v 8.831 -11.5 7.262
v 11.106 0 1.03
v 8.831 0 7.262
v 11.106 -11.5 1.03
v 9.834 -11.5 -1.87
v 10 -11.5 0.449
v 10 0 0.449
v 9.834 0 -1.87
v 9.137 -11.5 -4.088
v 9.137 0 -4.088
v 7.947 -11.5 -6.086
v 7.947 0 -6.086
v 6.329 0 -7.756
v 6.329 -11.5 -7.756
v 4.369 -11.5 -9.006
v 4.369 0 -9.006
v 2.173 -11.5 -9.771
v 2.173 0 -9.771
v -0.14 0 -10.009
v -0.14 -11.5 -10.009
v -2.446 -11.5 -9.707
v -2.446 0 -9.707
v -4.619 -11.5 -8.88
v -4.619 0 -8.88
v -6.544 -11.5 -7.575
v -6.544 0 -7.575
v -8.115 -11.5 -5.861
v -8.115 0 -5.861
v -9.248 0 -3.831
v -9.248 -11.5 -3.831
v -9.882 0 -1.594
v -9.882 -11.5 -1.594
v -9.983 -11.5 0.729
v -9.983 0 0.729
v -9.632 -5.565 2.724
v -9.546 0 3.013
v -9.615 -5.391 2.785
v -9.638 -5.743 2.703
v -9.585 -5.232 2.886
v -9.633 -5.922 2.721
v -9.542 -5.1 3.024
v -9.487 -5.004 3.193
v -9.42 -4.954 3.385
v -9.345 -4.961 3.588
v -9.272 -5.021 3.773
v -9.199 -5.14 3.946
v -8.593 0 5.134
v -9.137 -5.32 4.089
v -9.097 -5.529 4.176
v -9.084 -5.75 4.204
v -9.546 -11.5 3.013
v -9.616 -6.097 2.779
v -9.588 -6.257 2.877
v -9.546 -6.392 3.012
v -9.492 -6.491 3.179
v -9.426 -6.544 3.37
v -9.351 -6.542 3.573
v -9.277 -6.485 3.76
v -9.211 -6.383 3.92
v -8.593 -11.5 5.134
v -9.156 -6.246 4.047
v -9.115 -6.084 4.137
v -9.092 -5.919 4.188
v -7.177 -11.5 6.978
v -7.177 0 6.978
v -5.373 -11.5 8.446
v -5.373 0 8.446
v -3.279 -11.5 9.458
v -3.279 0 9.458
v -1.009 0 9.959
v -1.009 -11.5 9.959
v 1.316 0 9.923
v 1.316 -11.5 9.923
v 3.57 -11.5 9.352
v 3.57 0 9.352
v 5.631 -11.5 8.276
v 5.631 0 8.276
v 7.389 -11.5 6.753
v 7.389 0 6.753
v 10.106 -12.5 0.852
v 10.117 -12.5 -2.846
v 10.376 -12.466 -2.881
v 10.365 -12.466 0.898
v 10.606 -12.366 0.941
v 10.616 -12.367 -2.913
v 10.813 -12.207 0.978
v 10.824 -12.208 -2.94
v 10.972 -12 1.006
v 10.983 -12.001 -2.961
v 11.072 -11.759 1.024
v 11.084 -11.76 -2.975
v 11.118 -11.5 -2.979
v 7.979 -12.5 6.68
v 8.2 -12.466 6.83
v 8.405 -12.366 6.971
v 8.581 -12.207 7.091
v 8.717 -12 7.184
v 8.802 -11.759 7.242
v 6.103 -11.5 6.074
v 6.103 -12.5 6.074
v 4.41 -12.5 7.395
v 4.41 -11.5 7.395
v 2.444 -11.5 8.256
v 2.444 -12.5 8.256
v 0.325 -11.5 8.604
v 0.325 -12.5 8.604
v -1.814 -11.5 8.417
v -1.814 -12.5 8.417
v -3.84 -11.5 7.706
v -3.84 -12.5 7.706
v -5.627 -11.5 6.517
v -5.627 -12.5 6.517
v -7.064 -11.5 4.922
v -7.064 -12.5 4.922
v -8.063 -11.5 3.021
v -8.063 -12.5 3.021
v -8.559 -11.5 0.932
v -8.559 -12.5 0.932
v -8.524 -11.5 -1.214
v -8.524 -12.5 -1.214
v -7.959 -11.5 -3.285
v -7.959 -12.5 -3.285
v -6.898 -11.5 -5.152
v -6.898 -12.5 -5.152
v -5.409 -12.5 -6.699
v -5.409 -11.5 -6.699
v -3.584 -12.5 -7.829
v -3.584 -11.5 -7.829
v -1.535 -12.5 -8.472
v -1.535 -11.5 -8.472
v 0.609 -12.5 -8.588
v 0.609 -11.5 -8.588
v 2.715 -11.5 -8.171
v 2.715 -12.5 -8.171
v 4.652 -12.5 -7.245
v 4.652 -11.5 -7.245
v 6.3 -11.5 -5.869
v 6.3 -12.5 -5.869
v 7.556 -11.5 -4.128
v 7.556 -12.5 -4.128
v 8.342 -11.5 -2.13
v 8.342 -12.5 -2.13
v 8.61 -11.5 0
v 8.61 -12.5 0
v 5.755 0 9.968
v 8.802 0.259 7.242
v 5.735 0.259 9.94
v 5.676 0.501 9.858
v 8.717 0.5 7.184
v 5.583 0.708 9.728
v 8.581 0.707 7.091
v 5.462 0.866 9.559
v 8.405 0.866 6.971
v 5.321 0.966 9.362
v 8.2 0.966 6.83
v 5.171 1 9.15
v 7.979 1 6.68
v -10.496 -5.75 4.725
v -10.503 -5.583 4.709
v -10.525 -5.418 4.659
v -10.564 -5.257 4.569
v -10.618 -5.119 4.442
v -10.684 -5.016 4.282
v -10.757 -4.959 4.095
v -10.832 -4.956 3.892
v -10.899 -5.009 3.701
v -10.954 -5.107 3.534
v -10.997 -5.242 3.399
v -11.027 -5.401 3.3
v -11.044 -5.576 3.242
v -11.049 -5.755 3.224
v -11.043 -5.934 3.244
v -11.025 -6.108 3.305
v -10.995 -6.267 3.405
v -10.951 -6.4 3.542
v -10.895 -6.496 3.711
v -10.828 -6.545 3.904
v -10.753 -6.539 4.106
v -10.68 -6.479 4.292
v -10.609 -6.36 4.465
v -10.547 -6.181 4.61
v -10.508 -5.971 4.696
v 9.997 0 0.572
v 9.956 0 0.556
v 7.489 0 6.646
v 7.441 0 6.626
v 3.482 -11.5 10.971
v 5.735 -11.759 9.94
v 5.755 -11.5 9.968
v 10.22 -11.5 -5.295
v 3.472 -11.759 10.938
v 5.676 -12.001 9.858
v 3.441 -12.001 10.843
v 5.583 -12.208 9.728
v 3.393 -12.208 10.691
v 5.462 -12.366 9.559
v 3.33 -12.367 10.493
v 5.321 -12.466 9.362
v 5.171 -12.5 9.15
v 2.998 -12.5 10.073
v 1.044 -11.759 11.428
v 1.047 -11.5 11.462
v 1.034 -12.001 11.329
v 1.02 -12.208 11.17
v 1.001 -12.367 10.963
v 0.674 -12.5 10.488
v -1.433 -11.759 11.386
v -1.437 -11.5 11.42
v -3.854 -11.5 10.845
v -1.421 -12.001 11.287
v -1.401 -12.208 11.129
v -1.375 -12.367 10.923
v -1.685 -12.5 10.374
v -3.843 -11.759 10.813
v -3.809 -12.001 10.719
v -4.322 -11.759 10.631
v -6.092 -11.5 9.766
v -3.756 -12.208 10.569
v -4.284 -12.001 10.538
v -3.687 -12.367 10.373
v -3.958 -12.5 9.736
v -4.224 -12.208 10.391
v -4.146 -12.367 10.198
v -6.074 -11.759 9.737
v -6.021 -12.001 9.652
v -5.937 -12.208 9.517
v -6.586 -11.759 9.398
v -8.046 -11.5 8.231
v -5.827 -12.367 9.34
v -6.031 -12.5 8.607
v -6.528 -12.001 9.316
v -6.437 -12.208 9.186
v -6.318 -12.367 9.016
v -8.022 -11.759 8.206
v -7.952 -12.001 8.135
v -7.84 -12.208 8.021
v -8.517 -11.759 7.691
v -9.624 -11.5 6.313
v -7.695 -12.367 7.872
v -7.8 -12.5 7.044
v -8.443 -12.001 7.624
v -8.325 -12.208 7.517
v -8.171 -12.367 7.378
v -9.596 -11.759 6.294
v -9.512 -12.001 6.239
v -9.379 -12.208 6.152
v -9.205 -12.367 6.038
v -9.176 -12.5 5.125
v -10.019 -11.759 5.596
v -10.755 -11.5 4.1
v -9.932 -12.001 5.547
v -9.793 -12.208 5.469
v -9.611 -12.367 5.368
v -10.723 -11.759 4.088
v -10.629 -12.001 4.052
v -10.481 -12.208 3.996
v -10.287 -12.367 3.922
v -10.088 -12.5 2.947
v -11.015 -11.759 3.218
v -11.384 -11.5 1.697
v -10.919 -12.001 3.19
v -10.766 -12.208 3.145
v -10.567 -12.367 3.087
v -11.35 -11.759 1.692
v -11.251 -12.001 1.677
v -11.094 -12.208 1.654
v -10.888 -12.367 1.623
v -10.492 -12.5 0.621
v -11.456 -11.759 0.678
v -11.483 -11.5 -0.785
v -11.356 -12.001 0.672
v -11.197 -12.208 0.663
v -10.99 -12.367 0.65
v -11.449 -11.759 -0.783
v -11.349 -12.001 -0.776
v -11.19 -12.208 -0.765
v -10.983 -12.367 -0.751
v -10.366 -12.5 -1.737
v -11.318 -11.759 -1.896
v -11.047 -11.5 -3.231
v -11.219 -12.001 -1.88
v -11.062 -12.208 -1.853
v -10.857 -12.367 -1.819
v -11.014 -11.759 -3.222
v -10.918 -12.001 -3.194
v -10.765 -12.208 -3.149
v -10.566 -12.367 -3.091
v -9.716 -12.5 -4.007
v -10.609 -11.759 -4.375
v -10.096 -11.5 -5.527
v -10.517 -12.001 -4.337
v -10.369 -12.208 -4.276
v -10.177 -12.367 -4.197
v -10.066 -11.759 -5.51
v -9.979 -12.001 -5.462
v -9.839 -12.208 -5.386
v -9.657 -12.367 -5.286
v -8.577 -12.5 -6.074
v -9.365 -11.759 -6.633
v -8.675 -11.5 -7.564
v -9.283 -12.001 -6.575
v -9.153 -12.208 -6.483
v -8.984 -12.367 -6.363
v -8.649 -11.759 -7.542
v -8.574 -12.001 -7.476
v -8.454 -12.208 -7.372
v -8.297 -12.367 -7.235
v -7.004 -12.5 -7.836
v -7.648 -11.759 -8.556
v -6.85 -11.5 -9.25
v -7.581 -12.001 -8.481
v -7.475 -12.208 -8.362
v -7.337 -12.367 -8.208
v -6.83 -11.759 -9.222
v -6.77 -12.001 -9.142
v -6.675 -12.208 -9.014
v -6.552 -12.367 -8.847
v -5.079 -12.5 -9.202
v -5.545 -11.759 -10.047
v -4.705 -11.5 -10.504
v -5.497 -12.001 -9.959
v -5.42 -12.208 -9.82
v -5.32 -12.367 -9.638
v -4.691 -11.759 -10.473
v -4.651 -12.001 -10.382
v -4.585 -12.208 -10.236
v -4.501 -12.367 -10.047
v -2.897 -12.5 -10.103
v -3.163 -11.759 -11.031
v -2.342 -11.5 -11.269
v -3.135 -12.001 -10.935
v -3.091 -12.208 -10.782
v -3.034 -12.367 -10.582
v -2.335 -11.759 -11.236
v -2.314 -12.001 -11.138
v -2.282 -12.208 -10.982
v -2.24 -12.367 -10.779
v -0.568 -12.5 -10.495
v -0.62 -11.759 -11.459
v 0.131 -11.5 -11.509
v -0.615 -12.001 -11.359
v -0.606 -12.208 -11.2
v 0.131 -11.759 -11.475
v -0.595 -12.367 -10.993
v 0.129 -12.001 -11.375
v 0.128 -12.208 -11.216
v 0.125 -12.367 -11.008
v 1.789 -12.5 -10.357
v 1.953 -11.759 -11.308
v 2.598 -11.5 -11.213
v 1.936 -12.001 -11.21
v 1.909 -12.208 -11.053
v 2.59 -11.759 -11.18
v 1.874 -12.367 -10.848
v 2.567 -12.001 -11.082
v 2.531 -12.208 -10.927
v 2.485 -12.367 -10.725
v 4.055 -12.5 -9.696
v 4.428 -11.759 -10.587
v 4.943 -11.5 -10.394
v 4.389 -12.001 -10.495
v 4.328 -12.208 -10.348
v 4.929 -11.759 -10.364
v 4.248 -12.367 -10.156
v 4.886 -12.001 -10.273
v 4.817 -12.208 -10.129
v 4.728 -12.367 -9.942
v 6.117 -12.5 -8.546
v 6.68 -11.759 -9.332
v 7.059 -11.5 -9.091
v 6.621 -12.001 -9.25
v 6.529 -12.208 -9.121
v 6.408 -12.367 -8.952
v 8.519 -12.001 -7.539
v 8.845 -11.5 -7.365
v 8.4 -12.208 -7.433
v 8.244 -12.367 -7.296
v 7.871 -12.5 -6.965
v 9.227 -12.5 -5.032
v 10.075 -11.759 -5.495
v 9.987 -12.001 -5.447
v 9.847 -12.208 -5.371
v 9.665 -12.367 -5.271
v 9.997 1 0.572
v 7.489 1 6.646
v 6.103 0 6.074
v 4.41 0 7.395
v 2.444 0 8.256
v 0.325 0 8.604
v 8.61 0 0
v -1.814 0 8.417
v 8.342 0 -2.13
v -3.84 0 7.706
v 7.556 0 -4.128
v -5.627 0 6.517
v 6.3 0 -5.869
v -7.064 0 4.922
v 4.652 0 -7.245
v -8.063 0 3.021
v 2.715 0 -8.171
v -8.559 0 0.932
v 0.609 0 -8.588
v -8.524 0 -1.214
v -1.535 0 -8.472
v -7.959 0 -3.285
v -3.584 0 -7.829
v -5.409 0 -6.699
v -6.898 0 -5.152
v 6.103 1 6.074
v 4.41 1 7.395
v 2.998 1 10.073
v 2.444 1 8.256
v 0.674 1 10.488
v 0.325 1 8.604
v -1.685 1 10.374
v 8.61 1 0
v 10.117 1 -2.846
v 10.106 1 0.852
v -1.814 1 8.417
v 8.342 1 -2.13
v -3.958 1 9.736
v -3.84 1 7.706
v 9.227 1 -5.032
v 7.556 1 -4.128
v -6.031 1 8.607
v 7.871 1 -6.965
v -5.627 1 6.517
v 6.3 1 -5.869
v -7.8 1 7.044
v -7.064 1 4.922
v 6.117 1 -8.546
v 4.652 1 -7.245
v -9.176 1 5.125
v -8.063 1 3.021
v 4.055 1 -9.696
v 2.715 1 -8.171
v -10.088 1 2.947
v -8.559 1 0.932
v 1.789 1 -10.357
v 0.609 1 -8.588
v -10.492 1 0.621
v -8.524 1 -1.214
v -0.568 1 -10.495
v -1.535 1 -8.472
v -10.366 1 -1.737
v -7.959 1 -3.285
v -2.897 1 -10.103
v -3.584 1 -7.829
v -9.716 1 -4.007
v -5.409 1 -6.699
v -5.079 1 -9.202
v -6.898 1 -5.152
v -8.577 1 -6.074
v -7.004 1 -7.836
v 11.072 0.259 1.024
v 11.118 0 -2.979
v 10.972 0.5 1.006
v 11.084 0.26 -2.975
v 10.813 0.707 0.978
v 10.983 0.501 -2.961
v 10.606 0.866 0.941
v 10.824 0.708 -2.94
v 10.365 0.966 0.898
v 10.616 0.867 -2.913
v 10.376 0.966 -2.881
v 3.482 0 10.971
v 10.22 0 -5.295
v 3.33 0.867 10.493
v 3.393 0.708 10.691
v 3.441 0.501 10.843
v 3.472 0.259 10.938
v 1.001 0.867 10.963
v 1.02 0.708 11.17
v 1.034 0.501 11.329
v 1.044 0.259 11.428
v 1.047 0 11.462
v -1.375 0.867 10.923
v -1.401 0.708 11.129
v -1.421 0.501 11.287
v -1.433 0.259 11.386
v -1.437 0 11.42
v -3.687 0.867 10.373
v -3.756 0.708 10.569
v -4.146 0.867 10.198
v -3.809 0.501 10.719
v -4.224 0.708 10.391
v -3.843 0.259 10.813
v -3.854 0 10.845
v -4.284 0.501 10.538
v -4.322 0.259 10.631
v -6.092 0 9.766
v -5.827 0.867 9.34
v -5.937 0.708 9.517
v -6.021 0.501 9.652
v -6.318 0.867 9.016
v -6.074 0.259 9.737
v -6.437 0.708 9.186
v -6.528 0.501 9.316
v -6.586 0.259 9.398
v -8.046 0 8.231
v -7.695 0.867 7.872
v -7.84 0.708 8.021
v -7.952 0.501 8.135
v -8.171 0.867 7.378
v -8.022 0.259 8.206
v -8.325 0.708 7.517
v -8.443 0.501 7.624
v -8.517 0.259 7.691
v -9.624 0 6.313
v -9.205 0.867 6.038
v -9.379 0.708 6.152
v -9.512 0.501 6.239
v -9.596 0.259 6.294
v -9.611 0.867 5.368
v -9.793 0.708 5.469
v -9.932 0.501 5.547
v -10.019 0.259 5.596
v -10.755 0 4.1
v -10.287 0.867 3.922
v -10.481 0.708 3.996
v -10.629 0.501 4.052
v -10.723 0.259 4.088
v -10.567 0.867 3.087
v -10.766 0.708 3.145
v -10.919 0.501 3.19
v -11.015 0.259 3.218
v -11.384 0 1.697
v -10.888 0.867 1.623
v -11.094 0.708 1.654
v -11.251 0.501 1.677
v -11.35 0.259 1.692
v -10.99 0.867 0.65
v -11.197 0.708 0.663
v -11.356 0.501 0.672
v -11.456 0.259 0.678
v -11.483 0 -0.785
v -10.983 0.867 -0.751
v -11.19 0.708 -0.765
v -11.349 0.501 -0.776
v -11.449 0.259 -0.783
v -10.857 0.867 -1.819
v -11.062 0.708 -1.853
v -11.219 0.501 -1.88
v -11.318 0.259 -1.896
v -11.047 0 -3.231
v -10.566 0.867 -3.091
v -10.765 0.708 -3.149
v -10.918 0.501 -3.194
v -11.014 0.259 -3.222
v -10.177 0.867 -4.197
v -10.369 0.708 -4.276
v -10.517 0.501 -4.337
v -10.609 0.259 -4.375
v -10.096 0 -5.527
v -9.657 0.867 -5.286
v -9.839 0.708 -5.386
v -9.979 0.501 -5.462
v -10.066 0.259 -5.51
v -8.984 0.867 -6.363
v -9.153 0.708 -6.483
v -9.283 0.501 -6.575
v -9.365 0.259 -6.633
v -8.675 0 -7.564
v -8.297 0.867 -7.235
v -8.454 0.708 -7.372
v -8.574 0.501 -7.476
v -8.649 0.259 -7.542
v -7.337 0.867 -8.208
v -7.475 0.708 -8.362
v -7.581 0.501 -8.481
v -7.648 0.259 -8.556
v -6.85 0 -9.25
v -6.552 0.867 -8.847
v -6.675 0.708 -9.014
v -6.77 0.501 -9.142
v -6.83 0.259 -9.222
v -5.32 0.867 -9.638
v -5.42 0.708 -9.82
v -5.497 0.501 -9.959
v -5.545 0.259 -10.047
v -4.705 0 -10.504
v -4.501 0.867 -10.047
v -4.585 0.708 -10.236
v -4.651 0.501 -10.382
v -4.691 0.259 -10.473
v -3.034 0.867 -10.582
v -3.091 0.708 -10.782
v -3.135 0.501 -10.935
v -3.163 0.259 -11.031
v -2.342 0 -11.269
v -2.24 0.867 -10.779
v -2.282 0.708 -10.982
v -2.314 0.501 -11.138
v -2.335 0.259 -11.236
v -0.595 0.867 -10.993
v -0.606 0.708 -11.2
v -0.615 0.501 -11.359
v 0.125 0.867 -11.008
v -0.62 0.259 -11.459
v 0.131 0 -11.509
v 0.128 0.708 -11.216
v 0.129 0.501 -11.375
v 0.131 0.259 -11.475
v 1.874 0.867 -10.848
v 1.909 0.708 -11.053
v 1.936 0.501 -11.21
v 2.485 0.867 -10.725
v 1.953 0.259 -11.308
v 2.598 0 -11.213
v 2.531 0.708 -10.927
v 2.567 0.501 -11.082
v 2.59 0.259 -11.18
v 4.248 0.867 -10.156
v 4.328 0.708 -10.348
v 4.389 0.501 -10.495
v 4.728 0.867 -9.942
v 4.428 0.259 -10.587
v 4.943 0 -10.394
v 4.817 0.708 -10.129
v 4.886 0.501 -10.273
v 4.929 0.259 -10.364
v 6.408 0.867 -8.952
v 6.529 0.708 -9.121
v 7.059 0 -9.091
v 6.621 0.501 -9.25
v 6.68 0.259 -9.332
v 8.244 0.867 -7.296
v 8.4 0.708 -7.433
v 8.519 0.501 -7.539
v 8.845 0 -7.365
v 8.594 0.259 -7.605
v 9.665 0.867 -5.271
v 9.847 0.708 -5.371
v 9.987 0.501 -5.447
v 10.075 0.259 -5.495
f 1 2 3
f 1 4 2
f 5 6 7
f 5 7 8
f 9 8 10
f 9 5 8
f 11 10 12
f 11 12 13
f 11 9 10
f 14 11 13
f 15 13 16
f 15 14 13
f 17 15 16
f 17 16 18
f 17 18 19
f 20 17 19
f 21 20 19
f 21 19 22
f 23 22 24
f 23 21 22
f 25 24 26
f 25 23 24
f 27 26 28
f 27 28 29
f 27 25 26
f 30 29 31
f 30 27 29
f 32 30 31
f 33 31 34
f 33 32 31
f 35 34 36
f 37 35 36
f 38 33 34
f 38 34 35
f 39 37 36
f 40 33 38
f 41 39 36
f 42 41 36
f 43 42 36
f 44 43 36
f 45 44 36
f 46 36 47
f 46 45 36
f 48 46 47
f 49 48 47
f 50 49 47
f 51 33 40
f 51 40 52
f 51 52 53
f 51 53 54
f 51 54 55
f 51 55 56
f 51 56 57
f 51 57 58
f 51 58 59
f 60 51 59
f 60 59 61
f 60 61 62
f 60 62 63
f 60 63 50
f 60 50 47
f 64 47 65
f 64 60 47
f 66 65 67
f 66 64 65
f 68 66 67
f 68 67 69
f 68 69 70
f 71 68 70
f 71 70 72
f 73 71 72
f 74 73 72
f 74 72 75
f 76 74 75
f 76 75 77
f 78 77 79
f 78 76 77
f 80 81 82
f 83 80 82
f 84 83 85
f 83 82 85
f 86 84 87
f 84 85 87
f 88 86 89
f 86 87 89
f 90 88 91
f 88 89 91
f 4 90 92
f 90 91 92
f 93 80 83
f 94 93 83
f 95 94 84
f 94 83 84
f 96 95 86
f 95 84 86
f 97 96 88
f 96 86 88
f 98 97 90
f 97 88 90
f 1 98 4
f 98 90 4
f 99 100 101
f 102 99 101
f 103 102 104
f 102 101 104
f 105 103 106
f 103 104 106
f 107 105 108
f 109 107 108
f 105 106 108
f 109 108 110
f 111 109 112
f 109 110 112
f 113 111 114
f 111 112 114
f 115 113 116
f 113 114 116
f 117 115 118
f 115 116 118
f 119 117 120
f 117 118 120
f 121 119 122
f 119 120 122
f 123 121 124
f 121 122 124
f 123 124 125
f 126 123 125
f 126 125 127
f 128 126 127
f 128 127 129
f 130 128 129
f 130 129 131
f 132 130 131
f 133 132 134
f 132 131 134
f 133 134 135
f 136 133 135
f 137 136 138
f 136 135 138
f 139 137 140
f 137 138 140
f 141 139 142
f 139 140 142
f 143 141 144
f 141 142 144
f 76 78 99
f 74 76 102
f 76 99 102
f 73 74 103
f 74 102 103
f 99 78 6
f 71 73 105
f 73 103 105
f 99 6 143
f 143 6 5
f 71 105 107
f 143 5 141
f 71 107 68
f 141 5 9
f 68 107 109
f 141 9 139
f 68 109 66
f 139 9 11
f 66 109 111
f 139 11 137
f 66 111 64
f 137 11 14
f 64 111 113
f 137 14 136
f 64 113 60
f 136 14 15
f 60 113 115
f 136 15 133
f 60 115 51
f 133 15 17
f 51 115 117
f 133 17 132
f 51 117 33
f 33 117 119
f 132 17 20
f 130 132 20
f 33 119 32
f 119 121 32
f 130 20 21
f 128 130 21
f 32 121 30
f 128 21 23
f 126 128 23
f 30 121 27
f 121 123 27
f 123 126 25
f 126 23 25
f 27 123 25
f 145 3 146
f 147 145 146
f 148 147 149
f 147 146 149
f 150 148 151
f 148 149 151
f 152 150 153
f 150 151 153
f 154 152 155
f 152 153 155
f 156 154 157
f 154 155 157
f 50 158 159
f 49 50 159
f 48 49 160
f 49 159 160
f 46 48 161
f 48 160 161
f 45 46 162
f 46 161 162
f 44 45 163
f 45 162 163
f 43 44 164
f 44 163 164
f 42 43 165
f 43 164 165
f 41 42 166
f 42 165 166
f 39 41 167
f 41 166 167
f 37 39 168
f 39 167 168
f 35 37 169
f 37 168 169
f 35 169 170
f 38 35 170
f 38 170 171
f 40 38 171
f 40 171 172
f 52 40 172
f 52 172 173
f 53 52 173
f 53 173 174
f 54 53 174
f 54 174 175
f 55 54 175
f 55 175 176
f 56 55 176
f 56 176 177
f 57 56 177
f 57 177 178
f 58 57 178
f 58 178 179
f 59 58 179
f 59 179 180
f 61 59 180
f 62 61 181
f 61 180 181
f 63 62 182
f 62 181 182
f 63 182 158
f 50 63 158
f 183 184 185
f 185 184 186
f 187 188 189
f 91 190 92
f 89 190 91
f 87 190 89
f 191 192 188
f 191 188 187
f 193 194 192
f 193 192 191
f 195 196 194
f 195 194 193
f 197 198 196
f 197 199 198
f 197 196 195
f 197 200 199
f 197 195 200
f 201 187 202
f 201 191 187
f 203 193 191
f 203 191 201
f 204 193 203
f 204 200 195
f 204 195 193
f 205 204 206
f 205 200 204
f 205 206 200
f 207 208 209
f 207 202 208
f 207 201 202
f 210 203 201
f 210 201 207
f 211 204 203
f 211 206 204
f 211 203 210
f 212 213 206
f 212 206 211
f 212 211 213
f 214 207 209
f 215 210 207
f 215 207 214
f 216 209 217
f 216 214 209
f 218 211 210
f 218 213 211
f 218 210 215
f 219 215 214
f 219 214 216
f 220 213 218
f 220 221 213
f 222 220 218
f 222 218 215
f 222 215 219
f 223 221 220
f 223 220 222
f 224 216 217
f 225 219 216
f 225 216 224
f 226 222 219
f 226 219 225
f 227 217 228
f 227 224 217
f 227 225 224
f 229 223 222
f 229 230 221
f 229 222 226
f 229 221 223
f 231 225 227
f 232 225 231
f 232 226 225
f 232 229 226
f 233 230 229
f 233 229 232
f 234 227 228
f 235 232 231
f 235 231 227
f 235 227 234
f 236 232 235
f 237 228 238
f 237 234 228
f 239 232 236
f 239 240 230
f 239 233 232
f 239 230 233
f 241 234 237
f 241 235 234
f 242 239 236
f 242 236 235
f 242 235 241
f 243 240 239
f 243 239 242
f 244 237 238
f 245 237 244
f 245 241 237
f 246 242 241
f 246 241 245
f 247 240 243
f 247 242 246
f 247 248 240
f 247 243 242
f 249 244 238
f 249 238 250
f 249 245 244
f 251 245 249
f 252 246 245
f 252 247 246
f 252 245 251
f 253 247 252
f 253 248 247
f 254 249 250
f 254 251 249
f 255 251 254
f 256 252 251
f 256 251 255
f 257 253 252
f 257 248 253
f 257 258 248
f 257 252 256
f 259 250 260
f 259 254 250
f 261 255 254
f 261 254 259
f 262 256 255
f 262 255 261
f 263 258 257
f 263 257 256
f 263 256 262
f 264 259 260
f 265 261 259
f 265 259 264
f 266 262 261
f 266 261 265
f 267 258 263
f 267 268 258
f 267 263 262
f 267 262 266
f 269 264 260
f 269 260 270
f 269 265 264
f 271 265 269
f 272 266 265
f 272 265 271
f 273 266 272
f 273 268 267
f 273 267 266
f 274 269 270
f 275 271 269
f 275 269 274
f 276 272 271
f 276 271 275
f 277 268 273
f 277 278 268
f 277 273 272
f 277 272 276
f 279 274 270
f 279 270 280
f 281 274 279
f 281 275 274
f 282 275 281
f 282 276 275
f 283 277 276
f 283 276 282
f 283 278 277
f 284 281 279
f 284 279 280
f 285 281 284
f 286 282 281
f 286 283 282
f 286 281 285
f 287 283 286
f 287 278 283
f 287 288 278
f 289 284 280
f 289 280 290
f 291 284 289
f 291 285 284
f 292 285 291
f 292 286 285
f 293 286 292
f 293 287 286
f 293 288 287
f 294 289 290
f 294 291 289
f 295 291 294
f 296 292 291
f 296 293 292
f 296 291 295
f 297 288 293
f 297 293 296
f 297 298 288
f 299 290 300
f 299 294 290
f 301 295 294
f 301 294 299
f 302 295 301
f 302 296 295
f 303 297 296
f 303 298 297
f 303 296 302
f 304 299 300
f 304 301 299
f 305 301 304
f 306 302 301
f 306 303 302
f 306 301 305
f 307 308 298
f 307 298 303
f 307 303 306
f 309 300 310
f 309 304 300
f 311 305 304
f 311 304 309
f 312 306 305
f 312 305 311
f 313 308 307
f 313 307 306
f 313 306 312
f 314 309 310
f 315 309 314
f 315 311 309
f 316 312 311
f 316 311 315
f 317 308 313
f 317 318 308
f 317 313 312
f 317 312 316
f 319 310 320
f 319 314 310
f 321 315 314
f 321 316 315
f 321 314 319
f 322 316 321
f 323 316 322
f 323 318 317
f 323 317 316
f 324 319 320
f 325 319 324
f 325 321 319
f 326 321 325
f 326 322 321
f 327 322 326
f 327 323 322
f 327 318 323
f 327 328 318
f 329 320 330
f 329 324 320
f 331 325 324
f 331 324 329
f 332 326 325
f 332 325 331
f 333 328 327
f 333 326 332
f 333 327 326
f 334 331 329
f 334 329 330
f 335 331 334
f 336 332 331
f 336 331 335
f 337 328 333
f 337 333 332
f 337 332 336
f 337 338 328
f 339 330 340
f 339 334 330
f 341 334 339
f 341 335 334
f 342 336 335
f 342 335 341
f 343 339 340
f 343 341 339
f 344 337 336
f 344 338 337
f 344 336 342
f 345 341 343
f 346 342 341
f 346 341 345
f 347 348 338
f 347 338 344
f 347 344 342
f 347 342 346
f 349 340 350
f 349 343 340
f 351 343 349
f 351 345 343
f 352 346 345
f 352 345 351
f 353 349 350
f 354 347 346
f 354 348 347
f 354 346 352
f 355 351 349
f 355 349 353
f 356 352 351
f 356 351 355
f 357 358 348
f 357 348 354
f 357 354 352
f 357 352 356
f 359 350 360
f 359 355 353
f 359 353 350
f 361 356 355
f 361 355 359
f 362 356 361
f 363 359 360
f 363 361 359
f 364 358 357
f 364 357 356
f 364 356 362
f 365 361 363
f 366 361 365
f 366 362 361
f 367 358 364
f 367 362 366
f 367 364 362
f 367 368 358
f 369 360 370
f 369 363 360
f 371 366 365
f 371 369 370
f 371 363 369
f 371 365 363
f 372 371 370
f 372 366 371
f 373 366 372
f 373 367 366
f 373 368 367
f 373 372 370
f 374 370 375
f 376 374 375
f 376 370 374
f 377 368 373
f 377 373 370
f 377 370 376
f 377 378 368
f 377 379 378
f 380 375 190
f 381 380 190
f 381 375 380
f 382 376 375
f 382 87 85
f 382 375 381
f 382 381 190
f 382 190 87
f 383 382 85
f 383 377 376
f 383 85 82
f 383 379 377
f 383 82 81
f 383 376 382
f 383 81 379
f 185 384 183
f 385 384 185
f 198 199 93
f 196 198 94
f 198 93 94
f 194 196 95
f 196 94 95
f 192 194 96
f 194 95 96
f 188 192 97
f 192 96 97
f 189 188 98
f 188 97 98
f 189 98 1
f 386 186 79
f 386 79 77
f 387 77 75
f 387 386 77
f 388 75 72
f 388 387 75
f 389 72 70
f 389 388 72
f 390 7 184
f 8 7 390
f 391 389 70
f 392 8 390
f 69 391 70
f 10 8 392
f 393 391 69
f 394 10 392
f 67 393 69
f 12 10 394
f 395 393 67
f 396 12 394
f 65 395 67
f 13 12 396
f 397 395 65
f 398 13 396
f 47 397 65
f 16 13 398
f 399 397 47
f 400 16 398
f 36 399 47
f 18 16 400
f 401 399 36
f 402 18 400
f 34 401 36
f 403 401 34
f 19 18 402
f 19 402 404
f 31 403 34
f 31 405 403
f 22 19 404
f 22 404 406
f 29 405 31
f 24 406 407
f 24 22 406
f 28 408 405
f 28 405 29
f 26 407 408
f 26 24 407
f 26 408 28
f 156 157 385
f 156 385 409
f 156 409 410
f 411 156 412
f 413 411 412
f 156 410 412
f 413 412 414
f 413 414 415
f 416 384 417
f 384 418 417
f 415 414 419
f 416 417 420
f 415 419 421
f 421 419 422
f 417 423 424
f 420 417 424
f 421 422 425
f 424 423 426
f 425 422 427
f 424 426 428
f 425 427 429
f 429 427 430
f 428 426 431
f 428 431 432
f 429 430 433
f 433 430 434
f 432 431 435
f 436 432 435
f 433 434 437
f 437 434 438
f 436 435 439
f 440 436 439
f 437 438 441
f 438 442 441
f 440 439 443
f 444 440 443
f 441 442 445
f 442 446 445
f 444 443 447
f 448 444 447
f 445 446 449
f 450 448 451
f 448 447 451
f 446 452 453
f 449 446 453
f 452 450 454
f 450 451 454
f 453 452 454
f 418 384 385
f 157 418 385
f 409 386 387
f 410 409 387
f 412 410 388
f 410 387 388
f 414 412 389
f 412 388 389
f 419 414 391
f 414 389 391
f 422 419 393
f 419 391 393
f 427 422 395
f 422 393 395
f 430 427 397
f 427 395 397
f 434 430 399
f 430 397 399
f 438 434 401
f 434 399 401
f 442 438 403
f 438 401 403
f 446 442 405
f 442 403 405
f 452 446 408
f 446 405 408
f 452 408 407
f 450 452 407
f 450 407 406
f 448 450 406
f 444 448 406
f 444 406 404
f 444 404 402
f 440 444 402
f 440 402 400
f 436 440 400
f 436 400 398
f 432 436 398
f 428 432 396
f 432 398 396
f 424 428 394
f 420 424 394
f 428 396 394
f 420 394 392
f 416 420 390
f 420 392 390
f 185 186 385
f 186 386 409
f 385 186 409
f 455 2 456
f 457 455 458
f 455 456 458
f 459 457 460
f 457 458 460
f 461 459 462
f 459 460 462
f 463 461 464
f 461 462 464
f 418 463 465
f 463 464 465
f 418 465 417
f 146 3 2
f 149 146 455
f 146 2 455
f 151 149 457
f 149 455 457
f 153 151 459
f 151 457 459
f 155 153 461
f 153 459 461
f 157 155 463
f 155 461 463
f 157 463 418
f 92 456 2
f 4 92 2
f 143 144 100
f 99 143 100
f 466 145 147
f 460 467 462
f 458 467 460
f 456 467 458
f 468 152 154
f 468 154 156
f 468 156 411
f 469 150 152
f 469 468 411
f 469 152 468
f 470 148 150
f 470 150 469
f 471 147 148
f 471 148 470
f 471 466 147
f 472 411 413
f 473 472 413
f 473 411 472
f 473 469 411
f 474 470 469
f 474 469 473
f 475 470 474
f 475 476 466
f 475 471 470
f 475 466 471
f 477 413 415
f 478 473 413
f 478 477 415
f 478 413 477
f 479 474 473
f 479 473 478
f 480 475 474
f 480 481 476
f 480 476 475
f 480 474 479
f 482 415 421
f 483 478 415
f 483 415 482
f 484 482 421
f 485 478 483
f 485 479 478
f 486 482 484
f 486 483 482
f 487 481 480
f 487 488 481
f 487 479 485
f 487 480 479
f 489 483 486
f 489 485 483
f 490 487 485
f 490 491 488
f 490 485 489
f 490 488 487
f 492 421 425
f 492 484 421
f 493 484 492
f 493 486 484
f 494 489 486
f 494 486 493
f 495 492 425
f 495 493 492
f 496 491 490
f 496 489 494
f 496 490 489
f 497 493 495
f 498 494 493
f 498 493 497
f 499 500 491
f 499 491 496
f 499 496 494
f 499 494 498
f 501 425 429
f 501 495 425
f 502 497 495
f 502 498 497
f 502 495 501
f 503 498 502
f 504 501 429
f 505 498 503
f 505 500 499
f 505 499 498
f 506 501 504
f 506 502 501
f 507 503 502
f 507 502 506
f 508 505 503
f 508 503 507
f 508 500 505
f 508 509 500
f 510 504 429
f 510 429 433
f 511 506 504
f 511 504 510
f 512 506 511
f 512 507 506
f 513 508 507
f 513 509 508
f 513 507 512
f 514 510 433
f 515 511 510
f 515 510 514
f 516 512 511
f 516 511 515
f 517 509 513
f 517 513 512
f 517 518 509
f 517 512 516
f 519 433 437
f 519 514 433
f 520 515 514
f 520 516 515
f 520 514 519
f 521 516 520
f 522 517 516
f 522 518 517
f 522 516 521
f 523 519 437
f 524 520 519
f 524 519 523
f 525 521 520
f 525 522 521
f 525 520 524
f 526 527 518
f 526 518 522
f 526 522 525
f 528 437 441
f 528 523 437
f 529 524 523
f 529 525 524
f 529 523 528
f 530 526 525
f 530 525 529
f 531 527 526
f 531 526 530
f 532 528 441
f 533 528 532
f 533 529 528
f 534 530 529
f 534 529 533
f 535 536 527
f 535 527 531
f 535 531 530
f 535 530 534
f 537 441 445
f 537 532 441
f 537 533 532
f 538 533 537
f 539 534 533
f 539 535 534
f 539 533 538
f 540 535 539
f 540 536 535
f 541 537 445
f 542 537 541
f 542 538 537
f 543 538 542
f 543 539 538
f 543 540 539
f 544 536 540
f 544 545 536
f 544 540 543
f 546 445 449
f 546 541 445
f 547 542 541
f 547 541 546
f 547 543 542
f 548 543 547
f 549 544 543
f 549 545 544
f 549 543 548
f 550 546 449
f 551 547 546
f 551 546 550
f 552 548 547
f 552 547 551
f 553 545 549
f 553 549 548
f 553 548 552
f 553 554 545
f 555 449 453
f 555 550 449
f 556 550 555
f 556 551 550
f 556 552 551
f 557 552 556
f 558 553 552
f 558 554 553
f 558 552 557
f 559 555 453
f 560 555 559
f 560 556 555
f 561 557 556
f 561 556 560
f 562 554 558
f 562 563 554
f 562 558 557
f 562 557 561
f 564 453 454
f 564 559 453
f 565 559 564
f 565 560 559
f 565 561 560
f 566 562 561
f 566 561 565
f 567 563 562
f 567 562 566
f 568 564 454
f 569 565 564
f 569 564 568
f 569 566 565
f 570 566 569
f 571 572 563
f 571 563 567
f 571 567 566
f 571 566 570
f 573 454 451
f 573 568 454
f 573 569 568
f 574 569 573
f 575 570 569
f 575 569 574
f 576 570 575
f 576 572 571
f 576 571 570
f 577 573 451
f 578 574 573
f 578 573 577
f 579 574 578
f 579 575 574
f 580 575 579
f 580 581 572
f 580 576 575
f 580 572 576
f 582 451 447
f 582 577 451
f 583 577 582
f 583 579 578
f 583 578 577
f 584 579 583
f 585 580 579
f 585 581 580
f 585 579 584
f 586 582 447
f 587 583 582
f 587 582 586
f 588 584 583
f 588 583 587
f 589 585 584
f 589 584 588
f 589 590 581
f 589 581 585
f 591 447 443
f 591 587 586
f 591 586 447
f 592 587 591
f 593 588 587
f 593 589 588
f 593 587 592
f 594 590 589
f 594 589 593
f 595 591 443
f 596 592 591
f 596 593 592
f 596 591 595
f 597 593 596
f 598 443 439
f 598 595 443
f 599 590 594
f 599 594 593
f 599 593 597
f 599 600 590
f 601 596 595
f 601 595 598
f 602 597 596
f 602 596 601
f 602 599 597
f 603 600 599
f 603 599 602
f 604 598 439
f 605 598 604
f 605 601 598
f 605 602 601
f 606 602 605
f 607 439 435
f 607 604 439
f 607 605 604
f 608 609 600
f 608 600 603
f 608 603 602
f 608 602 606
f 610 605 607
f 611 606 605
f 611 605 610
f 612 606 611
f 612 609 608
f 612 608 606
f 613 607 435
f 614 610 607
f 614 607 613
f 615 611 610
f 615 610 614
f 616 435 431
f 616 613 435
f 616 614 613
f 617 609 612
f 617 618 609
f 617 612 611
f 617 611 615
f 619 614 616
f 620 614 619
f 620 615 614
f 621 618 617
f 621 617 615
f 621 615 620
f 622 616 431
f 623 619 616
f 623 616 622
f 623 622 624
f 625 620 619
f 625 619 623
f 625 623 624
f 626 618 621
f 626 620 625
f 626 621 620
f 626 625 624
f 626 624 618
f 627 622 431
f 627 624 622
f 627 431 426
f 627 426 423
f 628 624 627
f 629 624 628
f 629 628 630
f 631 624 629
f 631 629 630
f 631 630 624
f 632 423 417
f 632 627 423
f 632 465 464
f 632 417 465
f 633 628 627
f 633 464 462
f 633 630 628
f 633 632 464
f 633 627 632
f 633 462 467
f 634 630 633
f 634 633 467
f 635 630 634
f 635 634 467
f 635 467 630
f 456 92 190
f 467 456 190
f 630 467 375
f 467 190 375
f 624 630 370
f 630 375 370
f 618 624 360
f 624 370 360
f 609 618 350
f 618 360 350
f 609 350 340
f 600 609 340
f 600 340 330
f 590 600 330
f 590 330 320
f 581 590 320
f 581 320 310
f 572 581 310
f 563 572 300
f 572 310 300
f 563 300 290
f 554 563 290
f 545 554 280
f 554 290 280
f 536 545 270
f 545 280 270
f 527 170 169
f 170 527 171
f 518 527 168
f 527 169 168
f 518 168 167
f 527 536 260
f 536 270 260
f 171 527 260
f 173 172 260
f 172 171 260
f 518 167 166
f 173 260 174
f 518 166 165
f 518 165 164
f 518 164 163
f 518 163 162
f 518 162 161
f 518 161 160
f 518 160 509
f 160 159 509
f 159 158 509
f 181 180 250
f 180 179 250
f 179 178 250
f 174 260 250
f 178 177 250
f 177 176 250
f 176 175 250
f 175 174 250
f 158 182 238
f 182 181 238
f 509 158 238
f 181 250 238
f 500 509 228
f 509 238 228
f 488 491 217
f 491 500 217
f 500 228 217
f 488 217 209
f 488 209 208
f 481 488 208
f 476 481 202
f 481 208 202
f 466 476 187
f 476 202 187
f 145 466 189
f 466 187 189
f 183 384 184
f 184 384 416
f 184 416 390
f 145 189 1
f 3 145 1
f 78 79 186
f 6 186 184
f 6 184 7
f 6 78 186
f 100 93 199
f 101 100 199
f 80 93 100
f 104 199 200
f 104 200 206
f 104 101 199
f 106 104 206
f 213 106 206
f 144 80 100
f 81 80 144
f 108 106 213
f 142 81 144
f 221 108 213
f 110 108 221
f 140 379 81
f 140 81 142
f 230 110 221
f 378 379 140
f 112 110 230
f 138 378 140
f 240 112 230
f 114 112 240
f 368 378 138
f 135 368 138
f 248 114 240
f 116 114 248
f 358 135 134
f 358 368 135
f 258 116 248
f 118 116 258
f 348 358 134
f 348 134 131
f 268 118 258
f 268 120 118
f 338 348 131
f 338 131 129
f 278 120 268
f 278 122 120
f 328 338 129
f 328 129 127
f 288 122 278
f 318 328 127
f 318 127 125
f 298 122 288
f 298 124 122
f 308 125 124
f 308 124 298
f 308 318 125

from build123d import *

# Parameters (mm, degrees)
EXTRUDE_1_DEPTH     = 1
EXTRUDE_START       = 11.5
EXTRUDE_3_DEPTH     = 11.5
EXTRUDE_START_2     = 1
EXTRUDE_4_DEPTH     = 1
FILLET_1_R          = 1
FILLET_2_R          = 1
CUT_EXTRUDE_1_DEPTH = 1.5
SKETCH2_R           = 0.8000000000000002
CUT_EXTRUDE1_DEPTH  = 10


with BuildPart() as part:
    # 草图1 → 凸台-拉伸1 (new body)
    with BuildSketch(Plane(origin=(0, 0, 0), x_dir=(1, 0, 0), z_dir=(0, 1, 0))):
        with BuildLine():
            Line((11.105707880639235, -1.030263157894738), (8.830971038533972, -7.261995457156121))
            Line((8.830971038533972, -7.261995457156121), (5.755000000000001, -9.96795239755889))
            ThreePointArc((5.755000000000001, -9.96795239755889), (-10.633853419204911, 4.404686306522179), (11.117806260587173, 2.9790072091300246))
            Line((11.117806260587173, 2.9790072091300246), (11.105707880639235, -1.030263157894738))
        make_face()
        with BuildLine():
            Line((8.61, 0), (6.102725069252079, -6.073618915368515))
            ThreePointArc((6.102725069252079, -6.073618915368515), (-7.958535130482882, 3.2853947368421053), (8.61, 0))
        make_face(mode=Mode.SUBTRACT)
    extrude(amount=EXTRUDE_1_DEPTH)

    # 草图2 → 凸台-拉伸3 (add)
    with BuildSketch(Plane(origin=(0, 0, 0), x_dir=(-1, 0, 0), z_dir=(0, -1, 0)).offset(EXTRUDE_START)):
        with BuildLine():
            Line((-11.105707880639235, -1.0302631578947385), (-11.117806260587194, 2.979007209129939))
            ThreePointArc((-11.117806260587194, 2.979007209129939), (10.633853419204895, 4.4046863065222155), (-5.755, -9.967952397558888))
            Line((-5.755, -9.967952397558888), (-8.830971038533972, -7.261995457156121))
            Line((-8.830971038533972, -7.261995457156121), (-11.105707880639235, -1.0302631578947385))
        make_face()
        with BuildLine():
            Line((-7.38872176822761, -6.753287394426469), (-9.999910578514989, -0.44931995471382746))
            ThreePointArc((-9.999910578514989, -0.44931995471382746), (9.248034120437978, 3.8306611579745526), (-7.38872176822761, -6.753287394426469))
        make_face(mode=Mode.SUBTRACT)
    extrude(amount=-EXTRUDE_3_DEPTH)

    # 草图5 → 凸台-拉伸4 (add)
    with BuildSketch(Plane(origin=(0, -11.5, 0), x_dir=(-1, 0, 0), z_dir=(0, -1, 0)).offset(EXTRUDE_START_2)):
        with BuildLine():
            Line((-11.117806260587196, 2.9790072091299398), (-11.105707880639235, -1.0302631578947385))
            Line((-11.105707880639235, -1.0302631578947385), (-8.830971038533972, -7.261995457156121))
            Line((-8.830971038533972, -7.261995457156121), (-5.75500000000001, -9.967952397558882))
            ThreePointArc((-5.75500000000001, -9.967952397558882), (10.633853419204897, 4.4046863065222155), (-11.117806260587196, 2.9790072091299398))
        make_face()
        with BuildLine():
            Line((-8.609999999999998, 4.3e-16), (-6.102725069252077, -6.073618915368515))
            ThreePointArc((-6.102725069252077, -6.073618915368515), (7.958535130482882, 3.2853947368421044), (-8.609999999999998, 4.3e-16))
        make_face(mode=Mode.SUBTRACT)
    extrude(amount=-EXTRUDE_4_DEPTH)

    # 圆角1
    # the kernel refuses this fillet: 1 mm, written as the material it takes off along each edge
    with BuildSketch(Plane(origin=(10.708026446892594, -12.5, 5.610734425716317), x_dir=(-0.6605044125759215, 0, -0.7508221633434492), z_dir=(-0.7508221633434492, 0, 0.6605044125759215))) as fillet_1_piece_1:
        with BuildLine():
            CenterArc((FILLET_1_R, -FILLET_1_R), FILLET_1_R, 90, 90)
            Line((-5.1e-16, -FILLET_1_R), (0, 0))
            Line((0, 0), (FILLET_1_R, 0))
        make_face()
    extrude(amount=9.096803728910329, mode=Mode.SUBTRACT)
    with BuildSketch(Plane(origin=(6.9e-16, -12.5, -2.44e-15), x_dir=(0.6755263906448474, 0, 0.7373358092093079), z_dir=(0.7373358092093079, 0, -0.6755263906448474))) as fillet_1_piece_2:
        with BuildLine():
            CenterArc((11.509999999999996 - FILLET_1_R, -FILLET_1_R), FILLET_1_R, 0, 90)
            Line((11.509999999999996 - FILLET_1_R, 0), (11.509999999999996, 0))
            Line((11.509999999999996, 0), (11.509999999999996, -FILLET_1_R))
        make_face()
    revolve(axis=Axis((6.9e-16, -12.5, -2.44e-15), (0, -1, 0)), revolution_arc=309.9900816208065, mode=Mode.SUBTRACT)
    with BuildSketch(Plane(origin=(11.1253502297869, -12.5, -5.47899582680977), x_dir=(0, 1, 0), z_dir=(-0.0030175876798964035, 0, 0.9999954470719326))) as fillet_1_piece_3:
        with BuildLine():
            CenterArc((FILLET_1_R, FILLET_1_R), FILLET_1_R, 180, 90)
            Line((0, FILLET_1_R), (0, 0))
            Line((0, 0), (FILLET_1_R, 0))
        make_face()
    extrude(amount=9.009288621027371, mode=Mode.SUBTRACT)
    with BuildSketch(Plane(origin=(11.962944744412491, -12.5, -1.3181714184535556), x_dir=(7e-17, 1, 3e-17), z_dir=(-0.34289474550930243, 0, 0.9393738305393177))) as fillet_1_piece_4:
        with BuildLine():
            CenterArc((FILLET_1_R, FILLET_1_R), FILLET_1_R, 180, 90)
            Line((-8e-17, FILLET_1_R), (0, 0))
            Line((0, 0), (FILLET_1_R, 0))
        make_face()
    extrude(amount=11.633921551427072, mode=Mode.SUBTRACT)

    # 圆角2
    # the kernel refuses this fillet: 1 mm, written as the material it takes off along each edge
    with BuildSketch(Plane(origin=(11.1253502297869, 1, -5.4789958268098555), x_dir=(0, -1, 0), z_dir=(-0.0030175876798905804, 0, 0.9999954470719326))) as fillet_2_piece_1:
        with BuildLine():
            CenterArc((FILLET_2_R, -FILLET_2_R), FILLET_2_R, 90, 90)
            Line((0, -FILLET_2_R), (0, 0))
            Line((0, 0), (FILLET_2_R, 0))
        make_face()
    extrude(amount=9.009288621027455, mode=Mode.SUBTRACT)
    with BuildSketch(Plane(origin=(9.9e-16, 1, -2.2e-16), x_dir=(0.6755263906448468, 0, 0.7373358092093085), z_dir=(0.7373358092093085, 0, -0.6755263906448468))) as fillet_2_piece_2:
        with BuildLine():
            CenterArc((11.51 - FILLET_2_R, FILLET_2_R), FILLET_2_R, 270, 90)
            Line((11.51 - FILLET_2_R, 0), (11.51, 0))
            Line((11.51, 0), (11.51, FILLET_2_R))
        make_face()
    revolve(axis=Axis((9.9e-16, 1, -2.2e-16), (0, -1, 0)), revolution_arc=309.99008162080594, mode=Mode.SUBTRACT)
    with BuildSketch(Plane(origin=(10.708026446892594, 1, 5.610734425716318), x_dir=(-0.6605044125759214, 0, -0.7508221633434493), z_dir=(-0.7508221633434492, 0, 0.6605044125759213))) as fillet_2_piece_3:
        with BuildLine():
            CenterArc((FILLET_2_R, FILLET_2_R), FILLET_2_R, 180, 90)
            Line((0, FILLET_2_R), (0, 0))
            Line((0, 0), (FILLET_2_R, 0))
        make_face()
    extrude(amount=9.096803728910338, mode=Mode.SUBTRACT)
    with BuildSketch(Plane(origin=(11.962944744412493, 1, -1.318171418453556), x_dir=(-0.9393738305393178, 0, -0.3428947455093024), z_dir=(-0.3428947455093024, 0, 0.9393738305393177))) as fillet_2_piece_4:
        with BuildLine():
            CenterArc((FILLET_2_R, FILLET_2_R), FILLET_2_R, 180, 90)
            Line((-6.1e-16, FILLET_2_R), (0, 0))
            Line((0, 0), (FILLET_2_R, 0))
        make_face()
    extrude(amount=11.633921551427074, mode=Mode.SUBTRACT)

    # 草图7 → 切除-拉伸1 (cut)
    with BuildSketch(Plane(origin=(7.3563625346260375, 0, 3.036809457684256), x_dir=(-0.3815789473684208, 0, 0.9243362520886044), z_dir=(-0.9243362520886044, 0, -0.3815789473684208))):
        Polygon((-3.2853947368421035, 0), (3.2853947368421053, 0), (3.2853947368421057, 1), (-3.2853947368421035, 1), align=None)
    extrude(amount=-CUT_EXTRUDE_1_DEPTH, mode=Mode.SUBTRACT)

    # Sketch2 → Cut-Extrude1 (cut)
    with BuildSketch(Plane(origin=(-10.79858227646779, 0, 3.9838073269619487), x_dir=(0.3461170570774934, 0, 0.938191335922484), z_dir=(-0.938191335922484, 0, 0.34611705707749346))):
        with Locations((0, -5.75)):
            Circle(SKETCH2_R)
    extrude(amount=-CUT_EXTRUDE1_DEPTH, mode=Mode.SUBTRACT)


solid = part.part
